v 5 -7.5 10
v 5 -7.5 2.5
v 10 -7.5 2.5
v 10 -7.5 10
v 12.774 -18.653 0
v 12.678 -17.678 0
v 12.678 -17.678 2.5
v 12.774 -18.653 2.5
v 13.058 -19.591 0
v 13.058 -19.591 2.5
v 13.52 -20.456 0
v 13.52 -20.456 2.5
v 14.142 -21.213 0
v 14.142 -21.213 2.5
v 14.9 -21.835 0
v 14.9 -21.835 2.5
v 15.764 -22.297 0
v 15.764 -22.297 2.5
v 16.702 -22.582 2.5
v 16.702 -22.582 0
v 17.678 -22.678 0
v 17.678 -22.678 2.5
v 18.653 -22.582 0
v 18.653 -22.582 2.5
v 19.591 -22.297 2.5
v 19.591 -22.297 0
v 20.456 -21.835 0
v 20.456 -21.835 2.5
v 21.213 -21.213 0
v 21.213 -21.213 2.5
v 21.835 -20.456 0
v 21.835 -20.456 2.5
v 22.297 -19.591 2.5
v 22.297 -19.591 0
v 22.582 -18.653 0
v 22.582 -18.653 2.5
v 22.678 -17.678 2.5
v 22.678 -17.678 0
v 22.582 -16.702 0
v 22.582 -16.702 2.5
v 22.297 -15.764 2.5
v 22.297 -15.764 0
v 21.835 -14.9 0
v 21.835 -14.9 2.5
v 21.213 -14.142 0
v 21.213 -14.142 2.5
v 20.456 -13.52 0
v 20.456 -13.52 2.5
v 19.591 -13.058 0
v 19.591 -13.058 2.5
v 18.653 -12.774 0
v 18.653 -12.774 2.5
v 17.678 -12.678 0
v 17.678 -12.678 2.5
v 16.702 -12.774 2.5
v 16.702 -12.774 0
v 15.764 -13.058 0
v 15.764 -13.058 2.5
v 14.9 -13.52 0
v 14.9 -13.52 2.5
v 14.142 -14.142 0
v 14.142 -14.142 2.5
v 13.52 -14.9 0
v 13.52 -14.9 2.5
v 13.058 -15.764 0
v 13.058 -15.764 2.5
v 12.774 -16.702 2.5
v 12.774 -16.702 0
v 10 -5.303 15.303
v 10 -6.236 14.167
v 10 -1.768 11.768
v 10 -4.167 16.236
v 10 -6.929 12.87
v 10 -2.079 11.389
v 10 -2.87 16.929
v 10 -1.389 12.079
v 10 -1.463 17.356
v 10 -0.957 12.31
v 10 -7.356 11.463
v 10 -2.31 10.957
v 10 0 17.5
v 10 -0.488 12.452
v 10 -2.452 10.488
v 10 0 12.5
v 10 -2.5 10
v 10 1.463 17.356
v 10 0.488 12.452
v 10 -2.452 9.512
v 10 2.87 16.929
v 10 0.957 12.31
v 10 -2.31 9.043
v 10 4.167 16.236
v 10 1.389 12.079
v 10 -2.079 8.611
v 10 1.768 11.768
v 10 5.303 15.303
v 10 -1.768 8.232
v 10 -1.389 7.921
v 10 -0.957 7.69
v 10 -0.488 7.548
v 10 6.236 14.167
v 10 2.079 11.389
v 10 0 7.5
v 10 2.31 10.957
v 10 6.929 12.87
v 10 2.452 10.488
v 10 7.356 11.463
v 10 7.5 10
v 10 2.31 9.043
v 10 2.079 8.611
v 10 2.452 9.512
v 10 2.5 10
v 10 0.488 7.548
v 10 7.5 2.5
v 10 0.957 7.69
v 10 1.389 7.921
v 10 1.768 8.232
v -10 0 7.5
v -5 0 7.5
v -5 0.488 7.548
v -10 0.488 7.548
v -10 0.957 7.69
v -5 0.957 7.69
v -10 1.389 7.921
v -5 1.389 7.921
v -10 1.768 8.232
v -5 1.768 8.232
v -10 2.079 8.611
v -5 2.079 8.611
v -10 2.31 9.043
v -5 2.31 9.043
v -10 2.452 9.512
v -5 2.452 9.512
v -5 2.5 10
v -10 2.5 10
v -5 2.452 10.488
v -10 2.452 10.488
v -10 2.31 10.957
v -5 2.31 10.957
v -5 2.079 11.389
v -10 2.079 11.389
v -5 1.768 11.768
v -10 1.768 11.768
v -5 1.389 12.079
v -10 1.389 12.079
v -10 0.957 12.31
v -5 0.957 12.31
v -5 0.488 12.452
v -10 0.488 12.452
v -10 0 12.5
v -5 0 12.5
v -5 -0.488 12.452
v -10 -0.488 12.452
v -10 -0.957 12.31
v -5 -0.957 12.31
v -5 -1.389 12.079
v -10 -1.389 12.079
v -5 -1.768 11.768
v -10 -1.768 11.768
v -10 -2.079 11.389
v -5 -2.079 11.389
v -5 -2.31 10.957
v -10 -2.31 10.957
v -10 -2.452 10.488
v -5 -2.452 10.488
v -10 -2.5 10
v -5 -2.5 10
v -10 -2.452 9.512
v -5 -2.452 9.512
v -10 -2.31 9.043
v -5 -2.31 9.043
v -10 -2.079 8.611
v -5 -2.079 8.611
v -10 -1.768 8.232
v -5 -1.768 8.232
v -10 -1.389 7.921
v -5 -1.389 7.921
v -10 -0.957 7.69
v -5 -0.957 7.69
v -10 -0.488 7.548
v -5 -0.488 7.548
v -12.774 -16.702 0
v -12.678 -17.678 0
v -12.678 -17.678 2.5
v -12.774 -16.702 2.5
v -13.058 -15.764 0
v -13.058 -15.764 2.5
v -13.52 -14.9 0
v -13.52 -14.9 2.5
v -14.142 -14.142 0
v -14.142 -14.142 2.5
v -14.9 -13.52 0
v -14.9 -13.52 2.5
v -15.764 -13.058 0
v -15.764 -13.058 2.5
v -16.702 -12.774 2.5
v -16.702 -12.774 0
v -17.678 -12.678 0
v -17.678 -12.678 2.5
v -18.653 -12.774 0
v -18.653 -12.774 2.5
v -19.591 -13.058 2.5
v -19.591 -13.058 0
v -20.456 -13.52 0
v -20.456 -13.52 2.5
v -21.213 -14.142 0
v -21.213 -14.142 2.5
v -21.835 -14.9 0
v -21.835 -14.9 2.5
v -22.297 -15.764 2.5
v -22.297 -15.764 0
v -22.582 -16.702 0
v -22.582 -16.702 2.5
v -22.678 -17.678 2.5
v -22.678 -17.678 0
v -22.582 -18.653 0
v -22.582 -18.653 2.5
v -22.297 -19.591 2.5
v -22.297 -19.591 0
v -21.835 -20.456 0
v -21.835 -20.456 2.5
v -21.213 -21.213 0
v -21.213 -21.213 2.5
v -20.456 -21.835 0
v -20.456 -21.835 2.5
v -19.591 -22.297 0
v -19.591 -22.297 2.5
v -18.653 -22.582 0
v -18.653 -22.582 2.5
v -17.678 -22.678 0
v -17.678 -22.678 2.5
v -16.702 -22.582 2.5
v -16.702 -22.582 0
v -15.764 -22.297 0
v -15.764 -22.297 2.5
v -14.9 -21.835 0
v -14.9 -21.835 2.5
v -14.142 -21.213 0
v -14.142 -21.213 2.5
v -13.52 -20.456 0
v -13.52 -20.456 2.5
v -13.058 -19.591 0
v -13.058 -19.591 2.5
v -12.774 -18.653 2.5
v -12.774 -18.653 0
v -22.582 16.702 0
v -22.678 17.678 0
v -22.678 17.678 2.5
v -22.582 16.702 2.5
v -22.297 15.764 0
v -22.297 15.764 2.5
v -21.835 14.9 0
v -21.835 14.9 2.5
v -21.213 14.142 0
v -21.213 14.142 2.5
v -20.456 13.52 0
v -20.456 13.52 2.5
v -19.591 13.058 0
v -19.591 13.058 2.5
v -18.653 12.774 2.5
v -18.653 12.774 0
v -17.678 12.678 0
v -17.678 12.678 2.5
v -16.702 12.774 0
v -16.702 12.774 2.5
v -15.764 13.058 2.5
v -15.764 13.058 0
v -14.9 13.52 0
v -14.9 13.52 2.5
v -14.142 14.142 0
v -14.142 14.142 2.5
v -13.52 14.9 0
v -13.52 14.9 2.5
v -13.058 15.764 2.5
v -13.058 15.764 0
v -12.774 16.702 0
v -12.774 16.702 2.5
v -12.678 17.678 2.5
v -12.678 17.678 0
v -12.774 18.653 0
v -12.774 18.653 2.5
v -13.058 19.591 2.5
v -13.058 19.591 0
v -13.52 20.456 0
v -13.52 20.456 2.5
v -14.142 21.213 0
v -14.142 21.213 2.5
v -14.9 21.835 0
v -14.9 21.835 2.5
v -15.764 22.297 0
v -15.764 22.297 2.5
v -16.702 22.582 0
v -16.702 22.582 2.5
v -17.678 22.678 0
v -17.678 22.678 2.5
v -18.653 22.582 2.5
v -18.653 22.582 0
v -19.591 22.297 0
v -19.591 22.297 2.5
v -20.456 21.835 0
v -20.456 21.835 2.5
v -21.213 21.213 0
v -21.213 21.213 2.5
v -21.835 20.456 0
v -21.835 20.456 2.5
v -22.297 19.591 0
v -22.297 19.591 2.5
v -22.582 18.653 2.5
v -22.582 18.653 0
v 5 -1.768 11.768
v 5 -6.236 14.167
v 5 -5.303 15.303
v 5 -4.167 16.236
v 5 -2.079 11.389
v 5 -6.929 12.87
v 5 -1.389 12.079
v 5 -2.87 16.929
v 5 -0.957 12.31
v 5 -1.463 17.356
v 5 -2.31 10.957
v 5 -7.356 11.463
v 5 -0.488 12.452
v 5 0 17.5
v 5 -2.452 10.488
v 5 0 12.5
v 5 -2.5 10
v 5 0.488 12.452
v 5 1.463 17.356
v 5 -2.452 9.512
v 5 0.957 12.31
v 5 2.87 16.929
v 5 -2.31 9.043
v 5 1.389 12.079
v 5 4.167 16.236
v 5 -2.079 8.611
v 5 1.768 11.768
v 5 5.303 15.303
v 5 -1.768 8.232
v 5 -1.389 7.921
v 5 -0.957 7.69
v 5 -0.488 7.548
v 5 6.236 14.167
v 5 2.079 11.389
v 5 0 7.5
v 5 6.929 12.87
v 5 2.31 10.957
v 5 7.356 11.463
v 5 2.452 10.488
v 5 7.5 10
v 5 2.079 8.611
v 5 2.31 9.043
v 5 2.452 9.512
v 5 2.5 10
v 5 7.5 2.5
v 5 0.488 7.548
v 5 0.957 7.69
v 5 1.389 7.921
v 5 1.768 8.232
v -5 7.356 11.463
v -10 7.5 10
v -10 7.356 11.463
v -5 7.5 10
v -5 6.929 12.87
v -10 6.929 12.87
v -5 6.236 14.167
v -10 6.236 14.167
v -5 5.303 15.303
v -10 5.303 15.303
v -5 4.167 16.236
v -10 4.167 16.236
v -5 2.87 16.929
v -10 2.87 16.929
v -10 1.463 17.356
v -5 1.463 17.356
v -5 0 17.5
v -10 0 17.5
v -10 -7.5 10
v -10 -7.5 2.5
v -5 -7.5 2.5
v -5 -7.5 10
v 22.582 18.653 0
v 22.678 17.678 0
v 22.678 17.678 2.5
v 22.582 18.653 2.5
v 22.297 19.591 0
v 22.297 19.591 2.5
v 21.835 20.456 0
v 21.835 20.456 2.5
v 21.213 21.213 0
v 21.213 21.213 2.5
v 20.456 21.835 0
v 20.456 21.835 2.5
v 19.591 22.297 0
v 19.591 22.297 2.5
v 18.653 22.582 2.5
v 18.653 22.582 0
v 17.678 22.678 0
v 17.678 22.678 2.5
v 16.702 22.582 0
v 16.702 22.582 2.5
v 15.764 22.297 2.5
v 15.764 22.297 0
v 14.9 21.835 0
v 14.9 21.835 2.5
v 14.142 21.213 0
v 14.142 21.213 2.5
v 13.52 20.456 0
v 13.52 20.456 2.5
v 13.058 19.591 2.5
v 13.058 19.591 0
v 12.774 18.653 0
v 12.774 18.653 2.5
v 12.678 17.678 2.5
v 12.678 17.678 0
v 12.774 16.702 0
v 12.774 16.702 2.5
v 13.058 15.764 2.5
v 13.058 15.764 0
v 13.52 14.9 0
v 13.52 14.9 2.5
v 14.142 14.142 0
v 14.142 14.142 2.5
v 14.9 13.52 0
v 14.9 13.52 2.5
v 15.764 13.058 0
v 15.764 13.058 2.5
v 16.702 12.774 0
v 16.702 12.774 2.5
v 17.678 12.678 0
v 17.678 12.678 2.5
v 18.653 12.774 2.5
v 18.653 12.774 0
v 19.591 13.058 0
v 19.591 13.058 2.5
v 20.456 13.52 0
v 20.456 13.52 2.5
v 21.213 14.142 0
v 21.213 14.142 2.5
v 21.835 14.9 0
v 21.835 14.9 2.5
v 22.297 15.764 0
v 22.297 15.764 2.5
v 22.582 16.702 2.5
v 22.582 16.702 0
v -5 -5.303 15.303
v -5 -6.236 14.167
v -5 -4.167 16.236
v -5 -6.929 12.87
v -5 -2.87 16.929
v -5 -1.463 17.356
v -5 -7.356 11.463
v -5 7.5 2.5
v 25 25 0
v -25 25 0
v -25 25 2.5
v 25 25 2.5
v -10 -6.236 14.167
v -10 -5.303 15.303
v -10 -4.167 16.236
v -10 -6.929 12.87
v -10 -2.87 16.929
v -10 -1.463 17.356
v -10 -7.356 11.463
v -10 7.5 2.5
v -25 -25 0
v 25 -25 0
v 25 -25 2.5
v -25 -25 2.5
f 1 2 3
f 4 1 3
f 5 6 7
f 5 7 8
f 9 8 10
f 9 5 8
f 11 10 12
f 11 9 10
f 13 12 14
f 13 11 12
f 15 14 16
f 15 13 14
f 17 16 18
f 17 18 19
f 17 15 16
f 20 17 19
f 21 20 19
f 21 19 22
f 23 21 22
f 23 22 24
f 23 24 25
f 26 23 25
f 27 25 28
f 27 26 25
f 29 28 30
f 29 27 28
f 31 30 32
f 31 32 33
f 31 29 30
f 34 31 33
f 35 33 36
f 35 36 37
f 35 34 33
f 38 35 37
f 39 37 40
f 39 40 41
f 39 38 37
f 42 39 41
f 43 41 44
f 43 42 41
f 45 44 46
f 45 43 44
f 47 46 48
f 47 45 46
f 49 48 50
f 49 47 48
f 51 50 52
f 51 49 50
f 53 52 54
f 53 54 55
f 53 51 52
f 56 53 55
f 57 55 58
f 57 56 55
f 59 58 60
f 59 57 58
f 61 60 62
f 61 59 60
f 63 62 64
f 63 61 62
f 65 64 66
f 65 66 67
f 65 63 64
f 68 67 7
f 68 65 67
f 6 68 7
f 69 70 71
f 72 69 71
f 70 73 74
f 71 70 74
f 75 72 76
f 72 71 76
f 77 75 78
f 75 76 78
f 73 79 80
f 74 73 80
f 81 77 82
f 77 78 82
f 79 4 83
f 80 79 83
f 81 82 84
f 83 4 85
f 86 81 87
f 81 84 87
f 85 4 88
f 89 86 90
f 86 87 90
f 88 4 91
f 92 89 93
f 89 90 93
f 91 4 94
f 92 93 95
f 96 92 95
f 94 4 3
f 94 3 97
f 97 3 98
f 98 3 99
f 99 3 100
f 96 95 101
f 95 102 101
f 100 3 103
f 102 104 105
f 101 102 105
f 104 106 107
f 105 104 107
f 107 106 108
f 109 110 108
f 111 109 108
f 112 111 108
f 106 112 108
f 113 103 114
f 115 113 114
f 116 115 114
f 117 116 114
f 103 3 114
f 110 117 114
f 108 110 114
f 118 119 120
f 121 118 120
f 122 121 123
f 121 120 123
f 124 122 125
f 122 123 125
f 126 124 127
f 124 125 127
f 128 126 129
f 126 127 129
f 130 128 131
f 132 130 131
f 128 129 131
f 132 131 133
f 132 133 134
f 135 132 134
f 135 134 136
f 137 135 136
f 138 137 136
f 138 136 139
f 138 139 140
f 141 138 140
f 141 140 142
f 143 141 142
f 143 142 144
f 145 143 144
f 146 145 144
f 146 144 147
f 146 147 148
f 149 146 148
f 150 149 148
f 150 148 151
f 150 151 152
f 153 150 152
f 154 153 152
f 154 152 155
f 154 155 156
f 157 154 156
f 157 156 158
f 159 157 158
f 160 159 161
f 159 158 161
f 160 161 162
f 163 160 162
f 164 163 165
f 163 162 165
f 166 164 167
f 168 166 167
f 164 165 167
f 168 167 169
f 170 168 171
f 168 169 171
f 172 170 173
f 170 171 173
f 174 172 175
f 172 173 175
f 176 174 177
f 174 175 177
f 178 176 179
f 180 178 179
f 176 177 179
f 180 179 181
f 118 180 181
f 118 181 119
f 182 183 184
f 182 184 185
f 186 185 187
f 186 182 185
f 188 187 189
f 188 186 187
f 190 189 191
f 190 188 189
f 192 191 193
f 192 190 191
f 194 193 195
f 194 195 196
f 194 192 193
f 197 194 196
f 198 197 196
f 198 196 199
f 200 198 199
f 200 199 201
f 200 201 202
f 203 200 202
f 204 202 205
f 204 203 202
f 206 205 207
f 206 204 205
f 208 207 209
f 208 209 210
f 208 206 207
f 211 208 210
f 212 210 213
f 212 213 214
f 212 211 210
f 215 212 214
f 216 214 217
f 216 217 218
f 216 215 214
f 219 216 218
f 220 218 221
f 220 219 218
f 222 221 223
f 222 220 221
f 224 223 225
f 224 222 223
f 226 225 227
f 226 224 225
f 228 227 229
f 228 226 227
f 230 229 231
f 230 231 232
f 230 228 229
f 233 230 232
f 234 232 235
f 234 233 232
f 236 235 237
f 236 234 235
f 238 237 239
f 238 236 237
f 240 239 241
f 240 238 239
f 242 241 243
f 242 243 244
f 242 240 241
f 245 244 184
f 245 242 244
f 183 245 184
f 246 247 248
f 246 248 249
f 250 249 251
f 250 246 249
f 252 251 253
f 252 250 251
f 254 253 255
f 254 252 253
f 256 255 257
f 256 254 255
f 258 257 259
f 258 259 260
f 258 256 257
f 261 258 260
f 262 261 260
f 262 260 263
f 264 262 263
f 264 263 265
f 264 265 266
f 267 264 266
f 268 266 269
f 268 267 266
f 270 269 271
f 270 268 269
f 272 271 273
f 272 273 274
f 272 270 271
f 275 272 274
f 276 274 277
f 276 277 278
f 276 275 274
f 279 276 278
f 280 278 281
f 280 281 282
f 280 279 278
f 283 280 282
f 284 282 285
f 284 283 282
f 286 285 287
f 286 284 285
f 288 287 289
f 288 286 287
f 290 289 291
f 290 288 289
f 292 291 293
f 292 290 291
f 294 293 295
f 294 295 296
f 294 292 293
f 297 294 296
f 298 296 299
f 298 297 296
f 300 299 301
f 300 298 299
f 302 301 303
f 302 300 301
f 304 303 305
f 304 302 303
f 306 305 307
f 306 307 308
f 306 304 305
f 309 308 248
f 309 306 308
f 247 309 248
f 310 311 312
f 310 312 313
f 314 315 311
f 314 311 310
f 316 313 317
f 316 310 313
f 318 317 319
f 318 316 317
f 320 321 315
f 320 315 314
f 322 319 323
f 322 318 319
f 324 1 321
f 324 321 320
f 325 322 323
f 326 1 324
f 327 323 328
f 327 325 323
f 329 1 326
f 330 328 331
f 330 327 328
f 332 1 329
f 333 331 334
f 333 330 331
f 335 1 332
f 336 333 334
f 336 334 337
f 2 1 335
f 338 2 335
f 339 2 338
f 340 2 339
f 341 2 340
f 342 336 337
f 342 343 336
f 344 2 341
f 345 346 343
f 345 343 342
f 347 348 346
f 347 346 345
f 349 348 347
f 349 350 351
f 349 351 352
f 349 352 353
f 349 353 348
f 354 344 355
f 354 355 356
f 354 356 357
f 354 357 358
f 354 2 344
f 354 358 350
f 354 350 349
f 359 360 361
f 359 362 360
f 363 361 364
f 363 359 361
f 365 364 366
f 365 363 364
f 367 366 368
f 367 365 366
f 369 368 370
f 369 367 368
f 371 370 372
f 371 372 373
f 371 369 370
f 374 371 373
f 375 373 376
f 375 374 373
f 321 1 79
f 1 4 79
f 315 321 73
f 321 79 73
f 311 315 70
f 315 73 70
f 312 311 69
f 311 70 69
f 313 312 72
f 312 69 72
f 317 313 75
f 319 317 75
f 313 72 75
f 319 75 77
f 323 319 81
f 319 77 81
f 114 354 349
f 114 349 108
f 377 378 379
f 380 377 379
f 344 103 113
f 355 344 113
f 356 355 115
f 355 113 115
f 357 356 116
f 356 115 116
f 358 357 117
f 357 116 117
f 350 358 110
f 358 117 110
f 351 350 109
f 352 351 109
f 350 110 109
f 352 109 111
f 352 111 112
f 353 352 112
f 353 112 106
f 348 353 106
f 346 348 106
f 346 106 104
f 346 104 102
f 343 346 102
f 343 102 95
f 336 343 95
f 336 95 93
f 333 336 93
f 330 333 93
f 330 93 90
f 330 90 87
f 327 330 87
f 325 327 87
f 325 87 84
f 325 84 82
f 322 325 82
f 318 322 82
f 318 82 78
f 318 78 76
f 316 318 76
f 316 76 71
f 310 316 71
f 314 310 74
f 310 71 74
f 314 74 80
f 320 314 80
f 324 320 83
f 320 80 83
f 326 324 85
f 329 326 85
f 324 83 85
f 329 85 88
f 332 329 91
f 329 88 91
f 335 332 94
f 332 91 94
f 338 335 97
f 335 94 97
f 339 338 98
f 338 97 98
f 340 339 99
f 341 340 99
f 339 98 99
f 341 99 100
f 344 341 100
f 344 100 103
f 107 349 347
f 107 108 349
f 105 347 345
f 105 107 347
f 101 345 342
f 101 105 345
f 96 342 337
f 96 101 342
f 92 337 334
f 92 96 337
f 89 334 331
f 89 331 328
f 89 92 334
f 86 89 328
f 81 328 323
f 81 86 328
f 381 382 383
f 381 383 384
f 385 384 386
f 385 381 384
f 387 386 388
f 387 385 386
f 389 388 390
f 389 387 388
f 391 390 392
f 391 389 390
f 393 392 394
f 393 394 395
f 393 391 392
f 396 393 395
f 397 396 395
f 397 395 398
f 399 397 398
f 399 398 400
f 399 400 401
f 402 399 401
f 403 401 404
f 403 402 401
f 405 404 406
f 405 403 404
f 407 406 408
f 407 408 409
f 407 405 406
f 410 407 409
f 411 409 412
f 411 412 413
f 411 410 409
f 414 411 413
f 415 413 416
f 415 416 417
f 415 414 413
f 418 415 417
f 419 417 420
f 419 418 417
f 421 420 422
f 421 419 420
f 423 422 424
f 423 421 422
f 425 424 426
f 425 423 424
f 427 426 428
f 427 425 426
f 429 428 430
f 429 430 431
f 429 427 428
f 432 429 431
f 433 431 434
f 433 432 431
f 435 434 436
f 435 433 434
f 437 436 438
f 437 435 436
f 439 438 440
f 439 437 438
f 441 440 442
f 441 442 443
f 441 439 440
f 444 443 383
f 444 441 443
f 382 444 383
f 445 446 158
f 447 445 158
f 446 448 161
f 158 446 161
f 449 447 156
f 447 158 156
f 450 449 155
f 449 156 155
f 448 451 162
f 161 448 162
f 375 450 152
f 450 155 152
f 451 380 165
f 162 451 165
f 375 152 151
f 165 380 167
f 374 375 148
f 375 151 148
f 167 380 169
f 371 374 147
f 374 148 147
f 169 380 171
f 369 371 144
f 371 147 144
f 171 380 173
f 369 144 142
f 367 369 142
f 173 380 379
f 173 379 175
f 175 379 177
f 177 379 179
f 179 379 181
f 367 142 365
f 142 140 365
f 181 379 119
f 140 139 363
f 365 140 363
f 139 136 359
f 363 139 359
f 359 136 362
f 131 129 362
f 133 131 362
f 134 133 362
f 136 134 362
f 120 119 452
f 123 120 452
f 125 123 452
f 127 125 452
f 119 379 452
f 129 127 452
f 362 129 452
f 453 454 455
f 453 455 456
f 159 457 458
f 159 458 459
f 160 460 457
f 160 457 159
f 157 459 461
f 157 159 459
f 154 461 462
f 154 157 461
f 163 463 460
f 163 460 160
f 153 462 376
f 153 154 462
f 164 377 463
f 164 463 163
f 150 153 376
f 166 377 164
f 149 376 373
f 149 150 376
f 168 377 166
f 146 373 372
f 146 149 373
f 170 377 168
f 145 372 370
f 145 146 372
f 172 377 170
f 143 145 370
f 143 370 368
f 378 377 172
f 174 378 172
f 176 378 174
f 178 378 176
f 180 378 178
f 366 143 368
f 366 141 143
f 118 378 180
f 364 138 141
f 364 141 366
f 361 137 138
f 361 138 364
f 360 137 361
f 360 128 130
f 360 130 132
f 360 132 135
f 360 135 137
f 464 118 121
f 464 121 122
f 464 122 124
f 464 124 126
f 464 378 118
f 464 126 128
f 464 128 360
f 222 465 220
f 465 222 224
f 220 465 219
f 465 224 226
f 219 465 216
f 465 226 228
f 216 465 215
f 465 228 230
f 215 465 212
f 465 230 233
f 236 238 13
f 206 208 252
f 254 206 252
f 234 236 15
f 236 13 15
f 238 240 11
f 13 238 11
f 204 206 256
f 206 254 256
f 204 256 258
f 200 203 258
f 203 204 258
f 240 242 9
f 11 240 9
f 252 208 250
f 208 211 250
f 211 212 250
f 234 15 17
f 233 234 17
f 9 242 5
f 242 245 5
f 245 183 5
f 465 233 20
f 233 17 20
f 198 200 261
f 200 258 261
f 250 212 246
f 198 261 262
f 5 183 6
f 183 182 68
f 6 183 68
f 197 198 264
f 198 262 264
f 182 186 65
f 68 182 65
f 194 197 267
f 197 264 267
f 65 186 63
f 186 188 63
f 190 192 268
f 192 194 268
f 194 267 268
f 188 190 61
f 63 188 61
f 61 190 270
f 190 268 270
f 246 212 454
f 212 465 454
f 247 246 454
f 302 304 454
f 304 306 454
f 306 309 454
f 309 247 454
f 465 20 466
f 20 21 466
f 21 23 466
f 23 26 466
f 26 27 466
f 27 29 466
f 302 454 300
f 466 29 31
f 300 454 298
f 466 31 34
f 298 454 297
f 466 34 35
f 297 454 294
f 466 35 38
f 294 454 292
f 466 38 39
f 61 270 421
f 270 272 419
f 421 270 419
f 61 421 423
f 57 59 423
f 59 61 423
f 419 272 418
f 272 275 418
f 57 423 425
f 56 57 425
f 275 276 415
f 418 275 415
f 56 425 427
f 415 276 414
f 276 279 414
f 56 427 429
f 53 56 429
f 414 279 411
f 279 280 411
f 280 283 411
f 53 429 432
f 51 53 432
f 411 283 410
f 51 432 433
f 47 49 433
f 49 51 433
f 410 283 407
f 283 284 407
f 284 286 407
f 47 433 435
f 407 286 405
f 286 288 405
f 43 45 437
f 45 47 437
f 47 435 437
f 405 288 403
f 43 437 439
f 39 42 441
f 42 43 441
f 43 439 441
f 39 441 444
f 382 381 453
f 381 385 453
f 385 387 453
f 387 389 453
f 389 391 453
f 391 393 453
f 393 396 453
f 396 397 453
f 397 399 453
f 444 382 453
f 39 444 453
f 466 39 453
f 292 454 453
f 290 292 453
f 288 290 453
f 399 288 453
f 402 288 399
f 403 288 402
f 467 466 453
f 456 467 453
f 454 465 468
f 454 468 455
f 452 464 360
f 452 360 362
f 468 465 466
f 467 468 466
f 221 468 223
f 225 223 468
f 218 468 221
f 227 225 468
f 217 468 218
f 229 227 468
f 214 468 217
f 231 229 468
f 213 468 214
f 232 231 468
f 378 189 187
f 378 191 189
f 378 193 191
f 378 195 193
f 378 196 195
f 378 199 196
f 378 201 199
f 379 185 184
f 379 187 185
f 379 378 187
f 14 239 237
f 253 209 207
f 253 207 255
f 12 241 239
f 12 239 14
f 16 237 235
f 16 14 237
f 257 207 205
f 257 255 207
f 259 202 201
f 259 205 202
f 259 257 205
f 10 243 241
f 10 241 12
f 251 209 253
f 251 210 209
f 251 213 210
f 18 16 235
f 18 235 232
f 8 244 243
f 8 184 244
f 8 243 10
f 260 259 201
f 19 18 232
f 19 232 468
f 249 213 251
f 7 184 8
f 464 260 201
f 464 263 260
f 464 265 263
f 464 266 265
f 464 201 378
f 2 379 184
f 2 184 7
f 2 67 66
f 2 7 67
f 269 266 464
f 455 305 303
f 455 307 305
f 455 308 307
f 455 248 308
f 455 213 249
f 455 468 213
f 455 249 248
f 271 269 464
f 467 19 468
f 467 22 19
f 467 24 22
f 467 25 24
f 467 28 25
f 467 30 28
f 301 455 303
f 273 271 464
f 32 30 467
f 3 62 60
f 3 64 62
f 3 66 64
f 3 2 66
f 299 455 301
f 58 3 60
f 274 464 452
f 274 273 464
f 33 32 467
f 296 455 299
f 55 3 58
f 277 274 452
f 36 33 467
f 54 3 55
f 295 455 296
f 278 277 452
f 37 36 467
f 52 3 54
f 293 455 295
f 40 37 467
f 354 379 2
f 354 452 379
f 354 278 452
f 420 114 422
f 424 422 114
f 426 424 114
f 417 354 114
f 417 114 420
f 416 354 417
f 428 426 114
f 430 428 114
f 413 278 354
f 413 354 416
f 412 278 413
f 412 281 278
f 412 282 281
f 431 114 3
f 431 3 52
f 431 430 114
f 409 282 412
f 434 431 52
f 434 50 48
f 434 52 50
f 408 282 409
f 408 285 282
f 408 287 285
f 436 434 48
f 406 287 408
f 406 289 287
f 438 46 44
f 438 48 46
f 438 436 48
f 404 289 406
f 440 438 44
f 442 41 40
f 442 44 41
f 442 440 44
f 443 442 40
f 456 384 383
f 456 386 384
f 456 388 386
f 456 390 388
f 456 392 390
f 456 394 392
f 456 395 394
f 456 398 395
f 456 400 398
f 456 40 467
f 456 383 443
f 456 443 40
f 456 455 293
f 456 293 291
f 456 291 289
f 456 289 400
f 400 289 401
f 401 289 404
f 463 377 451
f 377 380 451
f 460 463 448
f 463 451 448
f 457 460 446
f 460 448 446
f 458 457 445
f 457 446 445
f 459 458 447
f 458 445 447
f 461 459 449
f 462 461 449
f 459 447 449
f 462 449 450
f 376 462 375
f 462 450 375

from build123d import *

# Parameters (mm, degrees)
SKETCH1_W           = 50
SKETCH1_H           = 50
SKETCH1_R           = 5
BOSS_EXTRUDE1_DEPTH = 2.5
SKETCH2_W           = 5
SKETCH2_H           = 15
BOSS_EXTRUDE2_DEPTH = 15
SKETCH3_R           = 2.5
CUT_EXTRUDE1_DEPTH  = 47.435439053
FILLET1_R           = 7.5


with BuildPart() as part:
    # Sketch1 → Boss-Extrude1 (new body)
    with BuildSketch(Plane.XY):
        Rectangle(SKETCH1_W, SKETCH1_H)
        with Locations((17.67766953, 17.67766953)):
            Circle(SKETCH1_R, mode=Mode.SUBTRACT)
        with Locations(Location((-17.67766953, 17.67766953, 0), (0, 0, 180))):
            Circle(SKETCH1_R, mode=Mode.SUBTRACT)
        with Locations(Location((17.67766953, -17.67766953, 0), (0, 0, 180))):
            Circle(SKETCH1_R, mode=Mode.SUBTRACT)
        with Locations((-17.67766953, -17.67766953)):
            Circle(SKETCH1_R, mode=Mode.SUBTRACT)
    extrude(amount=BOSS_EXTRUDE1_DEPTH)

    # Sketch2 → Boss-Extrude2 (add)
    with BuildSketch(Plane.XY.offset(2.5)):
        with Locations((-7.5, 0)):
            Rectangle(SKETCH2_W, SKETCH2_H)
        with Locations((7.5, 0)):
            Rectangle(SKETCH2_W, SKETCH2_H)
    extrude(amount=BOSS_EXTRUDE2_DEPTH)

    # Sketch3 → Cut-Extrude1 (cut, through all)
    with BuildSketch(Plane(origin=(10, 0, 0), x_dir=(0, 0, -1), z_dir=(1, 0, 0))):
        with Locations((-10, 0)):
            Circle(SKETCH3_R)
    extrude(amount=-CUT_EXTRUDE1_DEPTH, mode=Mode.SUBTRACT)

    # Fillet1
    fillet1_edges = [part.edges().sort_by_distance(p)[0] for p in [
        (-7.5, 7.5, 17.5),
        (-7.5, -7.5, 17.5),
        (7.5, -7.5, 17.5),
        (7.5, 7.5, 17.5),
    ]]
    fillet(fillet1_edges, radius=FILLET1_R - 0.0001)  # a hair under: the kernel refuses the full size


solid = part.part
